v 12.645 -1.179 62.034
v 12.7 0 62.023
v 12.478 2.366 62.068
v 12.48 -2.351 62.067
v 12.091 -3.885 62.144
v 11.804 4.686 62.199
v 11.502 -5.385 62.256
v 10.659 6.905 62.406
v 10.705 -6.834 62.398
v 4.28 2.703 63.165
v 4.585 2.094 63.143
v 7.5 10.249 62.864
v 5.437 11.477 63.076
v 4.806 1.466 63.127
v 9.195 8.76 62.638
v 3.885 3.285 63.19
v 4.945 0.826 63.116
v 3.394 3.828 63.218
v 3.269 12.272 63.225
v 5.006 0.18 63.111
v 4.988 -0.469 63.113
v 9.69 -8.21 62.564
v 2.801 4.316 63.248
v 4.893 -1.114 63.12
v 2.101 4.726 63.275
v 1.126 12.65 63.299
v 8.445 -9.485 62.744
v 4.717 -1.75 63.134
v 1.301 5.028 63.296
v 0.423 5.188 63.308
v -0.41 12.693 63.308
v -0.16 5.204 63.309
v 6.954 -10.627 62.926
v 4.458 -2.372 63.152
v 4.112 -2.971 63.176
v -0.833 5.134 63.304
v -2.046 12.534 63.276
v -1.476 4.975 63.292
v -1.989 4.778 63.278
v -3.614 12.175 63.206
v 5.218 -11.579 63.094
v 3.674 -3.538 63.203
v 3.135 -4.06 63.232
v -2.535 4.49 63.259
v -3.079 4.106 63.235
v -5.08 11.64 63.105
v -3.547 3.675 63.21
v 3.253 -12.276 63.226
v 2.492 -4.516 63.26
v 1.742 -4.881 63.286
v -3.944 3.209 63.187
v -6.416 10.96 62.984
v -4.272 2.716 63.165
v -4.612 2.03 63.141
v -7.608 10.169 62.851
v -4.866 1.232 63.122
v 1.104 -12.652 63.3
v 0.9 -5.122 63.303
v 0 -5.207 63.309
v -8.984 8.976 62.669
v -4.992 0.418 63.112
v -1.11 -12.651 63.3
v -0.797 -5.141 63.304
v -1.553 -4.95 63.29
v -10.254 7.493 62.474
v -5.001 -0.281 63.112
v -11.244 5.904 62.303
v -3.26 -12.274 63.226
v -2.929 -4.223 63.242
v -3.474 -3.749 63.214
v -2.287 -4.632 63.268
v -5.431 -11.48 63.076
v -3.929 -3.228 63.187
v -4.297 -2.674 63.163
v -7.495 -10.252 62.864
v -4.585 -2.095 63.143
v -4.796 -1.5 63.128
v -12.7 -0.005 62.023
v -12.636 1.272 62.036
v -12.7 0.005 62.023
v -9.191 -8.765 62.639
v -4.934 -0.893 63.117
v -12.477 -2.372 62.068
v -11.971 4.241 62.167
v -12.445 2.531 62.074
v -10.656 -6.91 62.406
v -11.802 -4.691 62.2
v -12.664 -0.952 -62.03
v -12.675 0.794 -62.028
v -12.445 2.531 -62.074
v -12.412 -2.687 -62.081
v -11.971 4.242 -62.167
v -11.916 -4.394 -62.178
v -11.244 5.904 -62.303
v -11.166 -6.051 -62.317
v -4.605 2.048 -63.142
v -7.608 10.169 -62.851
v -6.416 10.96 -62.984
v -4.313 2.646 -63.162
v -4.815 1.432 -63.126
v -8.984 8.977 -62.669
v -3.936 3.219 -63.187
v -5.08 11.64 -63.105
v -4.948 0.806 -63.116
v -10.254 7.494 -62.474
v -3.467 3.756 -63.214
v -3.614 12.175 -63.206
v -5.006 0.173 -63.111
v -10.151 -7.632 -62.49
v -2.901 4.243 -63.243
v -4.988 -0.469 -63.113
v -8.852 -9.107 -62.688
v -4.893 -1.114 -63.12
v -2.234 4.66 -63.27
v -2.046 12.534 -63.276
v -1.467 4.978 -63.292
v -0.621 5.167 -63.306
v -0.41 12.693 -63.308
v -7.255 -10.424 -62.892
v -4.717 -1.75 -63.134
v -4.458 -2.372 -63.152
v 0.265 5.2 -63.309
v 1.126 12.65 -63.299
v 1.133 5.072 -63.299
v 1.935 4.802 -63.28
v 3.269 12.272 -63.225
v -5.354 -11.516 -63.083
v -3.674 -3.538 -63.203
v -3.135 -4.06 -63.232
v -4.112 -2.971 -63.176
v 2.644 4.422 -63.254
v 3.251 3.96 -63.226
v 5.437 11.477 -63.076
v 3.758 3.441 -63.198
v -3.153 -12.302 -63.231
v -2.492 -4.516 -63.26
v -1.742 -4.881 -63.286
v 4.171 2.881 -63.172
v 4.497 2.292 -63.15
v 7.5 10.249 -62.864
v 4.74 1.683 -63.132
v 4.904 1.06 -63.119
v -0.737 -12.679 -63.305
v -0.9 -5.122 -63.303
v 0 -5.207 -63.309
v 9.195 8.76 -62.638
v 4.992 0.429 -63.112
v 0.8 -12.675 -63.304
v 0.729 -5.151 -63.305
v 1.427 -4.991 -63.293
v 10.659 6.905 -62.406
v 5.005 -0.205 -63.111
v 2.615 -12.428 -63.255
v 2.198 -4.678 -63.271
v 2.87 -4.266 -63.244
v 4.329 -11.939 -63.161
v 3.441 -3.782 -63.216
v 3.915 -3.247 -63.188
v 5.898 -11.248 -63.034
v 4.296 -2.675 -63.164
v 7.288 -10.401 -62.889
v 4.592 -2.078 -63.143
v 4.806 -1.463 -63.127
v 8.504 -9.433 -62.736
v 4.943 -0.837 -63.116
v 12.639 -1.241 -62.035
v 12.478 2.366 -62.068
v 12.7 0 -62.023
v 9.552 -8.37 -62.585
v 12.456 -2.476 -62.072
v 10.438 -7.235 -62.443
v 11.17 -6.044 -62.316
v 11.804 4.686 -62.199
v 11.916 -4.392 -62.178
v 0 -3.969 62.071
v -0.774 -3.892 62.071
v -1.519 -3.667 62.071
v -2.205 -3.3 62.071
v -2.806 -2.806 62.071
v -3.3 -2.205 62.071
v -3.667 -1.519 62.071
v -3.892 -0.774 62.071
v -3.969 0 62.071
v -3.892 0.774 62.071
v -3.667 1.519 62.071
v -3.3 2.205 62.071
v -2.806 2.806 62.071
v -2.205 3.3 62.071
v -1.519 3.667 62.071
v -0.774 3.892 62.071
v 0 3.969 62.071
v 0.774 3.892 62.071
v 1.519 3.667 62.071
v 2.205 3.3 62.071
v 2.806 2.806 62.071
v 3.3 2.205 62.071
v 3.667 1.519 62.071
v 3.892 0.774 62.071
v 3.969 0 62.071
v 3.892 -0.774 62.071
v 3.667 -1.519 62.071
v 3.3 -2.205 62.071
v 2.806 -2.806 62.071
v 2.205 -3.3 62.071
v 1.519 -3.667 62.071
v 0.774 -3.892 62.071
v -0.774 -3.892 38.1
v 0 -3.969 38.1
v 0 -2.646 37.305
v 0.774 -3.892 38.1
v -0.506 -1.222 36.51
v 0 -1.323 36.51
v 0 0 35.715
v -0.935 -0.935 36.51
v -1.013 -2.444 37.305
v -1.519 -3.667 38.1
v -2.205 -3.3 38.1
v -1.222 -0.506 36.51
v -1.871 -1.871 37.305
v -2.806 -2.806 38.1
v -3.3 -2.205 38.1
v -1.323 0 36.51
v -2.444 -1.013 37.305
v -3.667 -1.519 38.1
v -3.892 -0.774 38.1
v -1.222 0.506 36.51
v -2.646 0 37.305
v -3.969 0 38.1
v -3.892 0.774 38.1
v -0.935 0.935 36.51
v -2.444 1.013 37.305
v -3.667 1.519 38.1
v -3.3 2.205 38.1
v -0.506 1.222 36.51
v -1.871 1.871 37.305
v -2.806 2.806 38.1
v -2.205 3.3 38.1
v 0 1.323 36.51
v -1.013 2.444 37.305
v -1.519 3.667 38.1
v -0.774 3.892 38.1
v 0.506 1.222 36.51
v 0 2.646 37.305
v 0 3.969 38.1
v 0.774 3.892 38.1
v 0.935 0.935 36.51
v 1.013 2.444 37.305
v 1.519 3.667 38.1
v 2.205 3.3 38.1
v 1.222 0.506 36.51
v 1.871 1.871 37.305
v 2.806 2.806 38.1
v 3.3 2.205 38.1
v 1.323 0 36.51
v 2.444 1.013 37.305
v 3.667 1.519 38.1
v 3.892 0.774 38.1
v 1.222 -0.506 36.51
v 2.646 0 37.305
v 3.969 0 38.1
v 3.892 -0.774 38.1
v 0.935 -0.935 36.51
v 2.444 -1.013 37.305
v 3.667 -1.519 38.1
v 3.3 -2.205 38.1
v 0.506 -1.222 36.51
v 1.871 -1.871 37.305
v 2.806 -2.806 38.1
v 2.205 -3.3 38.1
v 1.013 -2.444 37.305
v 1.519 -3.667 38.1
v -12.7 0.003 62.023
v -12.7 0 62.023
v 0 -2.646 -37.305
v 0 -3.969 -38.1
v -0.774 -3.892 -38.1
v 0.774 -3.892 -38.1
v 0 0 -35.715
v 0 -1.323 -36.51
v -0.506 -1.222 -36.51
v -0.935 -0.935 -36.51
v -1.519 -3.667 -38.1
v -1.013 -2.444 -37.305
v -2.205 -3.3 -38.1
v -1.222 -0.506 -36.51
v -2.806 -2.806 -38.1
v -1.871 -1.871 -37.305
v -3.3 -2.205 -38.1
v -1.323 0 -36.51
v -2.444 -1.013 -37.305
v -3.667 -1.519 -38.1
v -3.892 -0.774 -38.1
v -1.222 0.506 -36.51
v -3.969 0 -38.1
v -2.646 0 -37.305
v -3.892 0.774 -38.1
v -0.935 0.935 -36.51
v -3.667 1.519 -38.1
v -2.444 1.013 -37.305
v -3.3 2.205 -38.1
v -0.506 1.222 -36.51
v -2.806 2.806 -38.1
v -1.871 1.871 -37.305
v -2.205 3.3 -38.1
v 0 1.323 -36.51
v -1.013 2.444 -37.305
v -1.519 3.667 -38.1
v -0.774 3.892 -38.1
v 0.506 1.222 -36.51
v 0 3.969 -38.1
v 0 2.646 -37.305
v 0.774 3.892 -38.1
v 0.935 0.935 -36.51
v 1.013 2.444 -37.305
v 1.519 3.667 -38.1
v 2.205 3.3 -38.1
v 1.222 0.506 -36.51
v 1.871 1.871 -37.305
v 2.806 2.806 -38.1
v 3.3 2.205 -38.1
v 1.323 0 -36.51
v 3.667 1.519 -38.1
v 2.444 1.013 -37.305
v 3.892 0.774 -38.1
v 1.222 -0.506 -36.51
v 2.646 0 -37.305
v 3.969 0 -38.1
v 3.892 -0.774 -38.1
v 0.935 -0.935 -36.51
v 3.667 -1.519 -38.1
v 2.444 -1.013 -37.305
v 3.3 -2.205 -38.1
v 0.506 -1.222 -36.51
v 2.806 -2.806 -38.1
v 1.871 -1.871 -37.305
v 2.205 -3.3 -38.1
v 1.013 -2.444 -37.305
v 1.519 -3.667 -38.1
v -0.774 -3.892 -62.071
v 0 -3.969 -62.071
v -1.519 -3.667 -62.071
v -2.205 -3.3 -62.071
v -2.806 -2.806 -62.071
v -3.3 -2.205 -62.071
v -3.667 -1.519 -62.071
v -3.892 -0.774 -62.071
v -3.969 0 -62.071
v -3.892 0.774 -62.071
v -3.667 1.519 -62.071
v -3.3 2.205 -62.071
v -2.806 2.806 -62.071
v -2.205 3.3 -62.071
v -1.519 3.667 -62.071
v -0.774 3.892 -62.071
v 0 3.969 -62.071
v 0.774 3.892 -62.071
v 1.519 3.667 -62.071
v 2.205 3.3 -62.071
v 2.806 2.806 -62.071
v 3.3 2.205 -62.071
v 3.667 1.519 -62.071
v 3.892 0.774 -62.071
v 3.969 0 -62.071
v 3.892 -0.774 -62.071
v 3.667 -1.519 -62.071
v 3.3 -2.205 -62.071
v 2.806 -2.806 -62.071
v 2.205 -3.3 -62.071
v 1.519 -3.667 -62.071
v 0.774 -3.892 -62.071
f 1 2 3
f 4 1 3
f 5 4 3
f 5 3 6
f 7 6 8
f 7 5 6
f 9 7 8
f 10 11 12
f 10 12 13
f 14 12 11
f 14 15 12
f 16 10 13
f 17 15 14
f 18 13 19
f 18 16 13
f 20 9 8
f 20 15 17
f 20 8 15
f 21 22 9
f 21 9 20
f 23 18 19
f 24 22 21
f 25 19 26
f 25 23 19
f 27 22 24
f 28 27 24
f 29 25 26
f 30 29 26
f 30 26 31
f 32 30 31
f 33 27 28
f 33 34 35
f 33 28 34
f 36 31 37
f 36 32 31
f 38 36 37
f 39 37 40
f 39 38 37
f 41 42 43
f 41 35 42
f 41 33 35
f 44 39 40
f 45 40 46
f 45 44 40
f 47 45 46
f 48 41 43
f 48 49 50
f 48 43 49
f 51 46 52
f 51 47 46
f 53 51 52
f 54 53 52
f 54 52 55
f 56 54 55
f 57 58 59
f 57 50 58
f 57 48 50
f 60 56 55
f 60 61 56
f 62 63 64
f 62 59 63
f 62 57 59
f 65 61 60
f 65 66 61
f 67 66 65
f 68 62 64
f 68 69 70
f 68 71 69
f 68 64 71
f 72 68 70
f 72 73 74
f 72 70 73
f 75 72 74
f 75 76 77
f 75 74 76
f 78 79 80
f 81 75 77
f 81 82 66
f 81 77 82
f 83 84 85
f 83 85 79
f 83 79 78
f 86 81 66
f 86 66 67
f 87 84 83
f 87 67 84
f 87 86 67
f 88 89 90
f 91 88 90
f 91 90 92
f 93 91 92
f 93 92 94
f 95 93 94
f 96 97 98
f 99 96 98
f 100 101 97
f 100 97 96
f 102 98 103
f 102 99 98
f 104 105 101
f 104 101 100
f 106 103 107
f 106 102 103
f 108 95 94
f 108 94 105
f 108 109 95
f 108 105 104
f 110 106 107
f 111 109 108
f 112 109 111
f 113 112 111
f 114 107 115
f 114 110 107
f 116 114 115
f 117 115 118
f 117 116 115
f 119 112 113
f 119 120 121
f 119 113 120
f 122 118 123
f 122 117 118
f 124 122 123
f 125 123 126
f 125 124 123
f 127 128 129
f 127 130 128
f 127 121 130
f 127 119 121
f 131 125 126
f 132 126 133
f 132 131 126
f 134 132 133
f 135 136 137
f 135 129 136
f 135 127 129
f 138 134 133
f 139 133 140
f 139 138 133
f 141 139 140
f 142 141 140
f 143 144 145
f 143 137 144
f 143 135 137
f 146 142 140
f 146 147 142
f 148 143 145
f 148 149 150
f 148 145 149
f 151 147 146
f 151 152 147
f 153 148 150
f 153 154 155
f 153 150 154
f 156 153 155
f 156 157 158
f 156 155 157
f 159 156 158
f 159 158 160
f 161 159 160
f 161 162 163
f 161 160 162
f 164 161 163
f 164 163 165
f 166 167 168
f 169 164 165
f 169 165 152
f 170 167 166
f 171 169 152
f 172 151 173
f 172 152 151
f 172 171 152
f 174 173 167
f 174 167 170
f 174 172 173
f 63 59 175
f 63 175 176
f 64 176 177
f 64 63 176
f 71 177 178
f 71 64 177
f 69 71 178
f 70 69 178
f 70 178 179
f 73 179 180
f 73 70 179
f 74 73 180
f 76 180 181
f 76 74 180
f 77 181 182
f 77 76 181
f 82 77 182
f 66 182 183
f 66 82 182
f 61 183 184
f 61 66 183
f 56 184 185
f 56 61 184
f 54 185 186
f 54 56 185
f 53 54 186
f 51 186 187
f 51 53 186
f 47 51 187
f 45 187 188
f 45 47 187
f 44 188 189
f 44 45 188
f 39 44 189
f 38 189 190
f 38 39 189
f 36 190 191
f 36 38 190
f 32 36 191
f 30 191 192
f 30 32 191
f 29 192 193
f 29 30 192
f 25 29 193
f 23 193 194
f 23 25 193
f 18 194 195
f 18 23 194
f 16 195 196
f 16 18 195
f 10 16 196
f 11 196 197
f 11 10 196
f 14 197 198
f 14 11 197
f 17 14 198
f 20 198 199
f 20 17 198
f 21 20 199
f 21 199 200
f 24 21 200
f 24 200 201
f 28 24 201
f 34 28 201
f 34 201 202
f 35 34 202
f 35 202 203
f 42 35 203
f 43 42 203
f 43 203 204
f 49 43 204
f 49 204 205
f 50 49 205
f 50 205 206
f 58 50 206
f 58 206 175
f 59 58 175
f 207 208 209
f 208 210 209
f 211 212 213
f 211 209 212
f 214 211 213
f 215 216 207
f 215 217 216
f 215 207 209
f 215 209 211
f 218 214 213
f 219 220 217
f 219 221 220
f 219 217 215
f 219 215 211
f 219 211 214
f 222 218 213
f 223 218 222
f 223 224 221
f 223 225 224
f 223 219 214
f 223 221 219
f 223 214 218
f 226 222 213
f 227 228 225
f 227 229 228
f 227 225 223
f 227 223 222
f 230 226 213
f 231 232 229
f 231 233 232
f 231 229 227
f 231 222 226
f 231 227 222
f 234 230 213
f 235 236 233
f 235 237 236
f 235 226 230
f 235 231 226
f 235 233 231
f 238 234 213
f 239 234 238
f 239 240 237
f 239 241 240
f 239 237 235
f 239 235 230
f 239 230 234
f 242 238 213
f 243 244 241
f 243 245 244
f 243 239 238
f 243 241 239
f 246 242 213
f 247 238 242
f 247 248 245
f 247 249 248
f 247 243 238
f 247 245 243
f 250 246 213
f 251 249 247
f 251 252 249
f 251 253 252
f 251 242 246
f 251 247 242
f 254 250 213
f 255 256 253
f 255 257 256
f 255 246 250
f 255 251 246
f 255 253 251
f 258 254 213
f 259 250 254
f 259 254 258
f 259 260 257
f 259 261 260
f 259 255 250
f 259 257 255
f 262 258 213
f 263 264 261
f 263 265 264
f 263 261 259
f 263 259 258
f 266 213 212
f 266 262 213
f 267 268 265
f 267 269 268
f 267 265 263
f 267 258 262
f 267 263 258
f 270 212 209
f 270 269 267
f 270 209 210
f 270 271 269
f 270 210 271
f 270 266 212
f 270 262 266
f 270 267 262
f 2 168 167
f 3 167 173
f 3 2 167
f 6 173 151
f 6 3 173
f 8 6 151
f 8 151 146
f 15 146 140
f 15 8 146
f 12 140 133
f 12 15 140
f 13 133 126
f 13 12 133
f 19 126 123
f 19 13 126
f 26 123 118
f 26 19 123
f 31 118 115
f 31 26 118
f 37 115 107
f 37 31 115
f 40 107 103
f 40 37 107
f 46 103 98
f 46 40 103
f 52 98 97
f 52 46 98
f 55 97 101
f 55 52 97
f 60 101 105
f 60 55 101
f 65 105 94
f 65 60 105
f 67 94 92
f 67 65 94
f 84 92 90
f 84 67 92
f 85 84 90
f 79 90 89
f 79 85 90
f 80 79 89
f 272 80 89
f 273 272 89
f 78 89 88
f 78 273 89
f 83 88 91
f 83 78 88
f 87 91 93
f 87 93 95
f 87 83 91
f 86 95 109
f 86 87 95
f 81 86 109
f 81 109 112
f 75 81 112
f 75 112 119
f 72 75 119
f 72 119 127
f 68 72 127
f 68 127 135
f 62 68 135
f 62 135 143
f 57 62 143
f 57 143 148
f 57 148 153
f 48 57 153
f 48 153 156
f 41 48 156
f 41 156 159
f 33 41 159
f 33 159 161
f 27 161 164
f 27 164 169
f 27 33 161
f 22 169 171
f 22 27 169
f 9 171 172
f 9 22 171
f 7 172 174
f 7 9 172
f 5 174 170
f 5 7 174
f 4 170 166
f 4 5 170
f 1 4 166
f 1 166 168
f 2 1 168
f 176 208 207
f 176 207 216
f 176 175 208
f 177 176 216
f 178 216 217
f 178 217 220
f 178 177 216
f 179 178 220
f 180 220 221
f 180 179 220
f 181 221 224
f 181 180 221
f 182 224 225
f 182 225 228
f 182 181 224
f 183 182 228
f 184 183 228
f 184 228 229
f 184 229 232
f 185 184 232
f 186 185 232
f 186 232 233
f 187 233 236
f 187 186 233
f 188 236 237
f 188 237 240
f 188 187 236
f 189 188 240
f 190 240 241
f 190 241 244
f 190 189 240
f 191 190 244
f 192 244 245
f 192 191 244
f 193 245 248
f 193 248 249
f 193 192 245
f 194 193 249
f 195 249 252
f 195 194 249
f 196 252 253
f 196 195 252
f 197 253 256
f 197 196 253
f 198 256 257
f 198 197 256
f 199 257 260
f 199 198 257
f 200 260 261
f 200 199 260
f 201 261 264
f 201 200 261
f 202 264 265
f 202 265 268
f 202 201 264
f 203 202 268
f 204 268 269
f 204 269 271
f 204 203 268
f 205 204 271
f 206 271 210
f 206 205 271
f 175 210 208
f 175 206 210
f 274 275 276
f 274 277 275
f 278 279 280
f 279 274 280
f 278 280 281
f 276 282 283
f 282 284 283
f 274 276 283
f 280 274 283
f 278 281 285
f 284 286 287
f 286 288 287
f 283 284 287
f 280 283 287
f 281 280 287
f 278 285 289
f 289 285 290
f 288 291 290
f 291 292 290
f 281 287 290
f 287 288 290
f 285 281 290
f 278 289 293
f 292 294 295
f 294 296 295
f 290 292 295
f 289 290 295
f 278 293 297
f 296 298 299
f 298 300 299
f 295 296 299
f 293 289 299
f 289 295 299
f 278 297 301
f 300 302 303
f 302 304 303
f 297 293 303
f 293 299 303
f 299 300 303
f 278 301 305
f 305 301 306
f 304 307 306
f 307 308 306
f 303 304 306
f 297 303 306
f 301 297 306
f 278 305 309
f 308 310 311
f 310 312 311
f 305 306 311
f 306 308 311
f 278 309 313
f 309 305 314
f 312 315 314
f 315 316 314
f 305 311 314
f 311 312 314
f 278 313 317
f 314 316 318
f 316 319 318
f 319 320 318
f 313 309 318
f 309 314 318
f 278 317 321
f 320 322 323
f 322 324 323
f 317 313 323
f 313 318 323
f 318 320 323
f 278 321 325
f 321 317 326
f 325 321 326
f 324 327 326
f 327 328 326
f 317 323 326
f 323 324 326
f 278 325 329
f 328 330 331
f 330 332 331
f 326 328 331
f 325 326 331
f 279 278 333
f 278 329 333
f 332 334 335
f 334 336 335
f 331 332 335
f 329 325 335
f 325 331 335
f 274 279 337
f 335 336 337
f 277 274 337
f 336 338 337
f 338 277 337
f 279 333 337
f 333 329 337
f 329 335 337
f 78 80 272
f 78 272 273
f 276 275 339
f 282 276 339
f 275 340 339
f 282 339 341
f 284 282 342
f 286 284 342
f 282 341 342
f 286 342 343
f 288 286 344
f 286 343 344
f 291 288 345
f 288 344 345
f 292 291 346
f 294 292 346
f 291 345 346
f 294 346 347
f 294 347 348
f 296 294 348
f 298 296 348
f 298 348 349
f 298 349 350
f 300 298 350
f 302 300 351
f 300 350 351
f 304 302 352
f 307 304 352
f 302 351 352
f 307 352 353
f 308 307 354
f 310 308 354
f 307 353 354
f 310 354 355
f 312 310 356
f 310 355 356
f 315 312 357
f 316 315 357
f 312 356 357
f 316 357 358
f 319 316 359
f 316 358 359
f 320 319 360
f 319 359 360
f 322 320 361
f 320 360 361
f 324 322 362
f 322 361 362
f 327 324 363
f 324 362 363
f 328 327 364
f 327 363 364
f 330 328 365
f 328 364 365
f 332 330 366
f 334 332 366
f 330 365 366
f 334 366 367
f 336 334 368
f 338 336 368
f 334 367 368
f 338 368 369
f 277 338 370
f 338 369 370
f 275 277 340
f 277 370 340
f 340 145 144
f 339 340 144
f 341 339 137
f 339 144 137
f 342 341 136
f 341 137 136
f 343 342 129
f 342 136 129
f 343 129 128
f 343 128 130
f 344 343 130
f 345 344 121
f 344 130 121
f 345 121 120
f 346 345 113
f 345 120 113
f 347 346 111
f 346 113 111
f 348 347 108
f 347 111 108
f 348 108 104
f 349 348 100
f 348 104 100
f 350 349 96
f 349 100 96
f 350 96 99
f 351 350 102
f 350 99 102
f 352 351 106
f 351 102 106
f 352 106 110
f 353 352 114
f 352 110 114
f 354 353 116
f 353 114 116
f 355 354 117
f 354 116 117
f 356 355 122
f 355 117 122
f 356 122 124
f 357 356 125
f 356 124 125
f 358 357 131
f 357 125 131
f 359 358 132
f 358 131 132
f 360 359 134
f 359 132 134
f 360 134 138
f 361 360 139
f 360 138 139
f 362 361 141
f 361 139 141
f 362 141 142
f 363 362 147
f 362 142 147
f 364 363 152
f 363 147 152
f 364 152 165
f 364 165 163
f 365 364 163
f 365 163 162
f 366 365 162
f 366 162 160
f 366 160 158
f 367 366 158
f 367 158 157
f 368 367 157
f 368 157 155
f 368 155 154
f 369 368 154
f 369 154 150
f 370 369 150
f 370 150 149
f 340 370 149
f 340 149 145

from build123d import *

# Parameters (mm, degrees)
SKETCH1_R      = 12.7
EXTRUDE1_DEPTH = 63.5
EXTRUDE2_START = -14
EXTRUDE2_DEPTH = 28


with BuildPart() as part:
    # Sketch1 → Extrude1 (new, symmetric)
    with BuildSketch(Plane.XY):
        Circle(SKETCH1_R)
    extrude(amount=EXTRUDE1_DEPTH, both=True)

    # Sketch4 → 3/8-16 Tapped Hole1 (revolve, cut)
    with BuildSketch(Plane(origin=(0, 0, 63.5), x_dir=(0, -1, 0), z_dir=(1, 0, 0))):
        Polygon((0, 0), (0, 27.784665582), (3.96875, 25.4), (3.96875, 1.42875), (5.3975, 0), align=None)
    f_3_8_16_tapped_hole1 = revolve(axis=Axis((0, 0, 69.85), (0, 0, -1)), mode=Mode.SUBTRACT)

    # Mirror1: 3/8-16 Tapped Hole1 across plane
    add(f_3_8_16_tapped_hole1.mirror(Plane.XY), mode=Mode.SUBTRACT)

    # Extrude2: read off the stored shape, not the designer's step
    # Extrude2 outline → Extrude2 (cut)
    with BuildSketch(Plane(origin=(0, 0, 0), x_dir=(1, 0, 0), z_dir=(0, 1, 0)).offset(EXTRUDE2_START)):
        with BuildLine():
            ThreePointArc((12.700884003, -62.02241801), (0.000451762, -63.309499998), (-12.699998846, -62.022599265))
            Line((-12.699998846, -62.022599265), (-14, -61.756405759))
            Line((-14, -61.756405759), (-14, -63.5))
            Line((-14, -63.5), (14, -63.5))
            Line((14, -63.5), (14, -61.756386435))
            Line((14, -61.756386435), (12.700884003, -62.02241801))
        make_face()
        with BuildLine():
            Line((-14, 63.5), (-14, 61.756405693))
            Line((-14, 61.756405693), (-12.700001857, 62.022598648))
            ThreePointArc((-12.700001857, 62.022598648), (0.000449638, 63.309499998), (12.700882852, 62.022418245))
            Line((12.700882852, 62.022418245), (14, 61.756386459))
            Line((14, 61.756386459), (14, 63.5))
            Line((14, 63.5), (-14, 63.5))
        make_face()
    extrude(amount=EXTRUDE2_DEPTH, mode=Mode.SUBTRACT)


solid = part.part
